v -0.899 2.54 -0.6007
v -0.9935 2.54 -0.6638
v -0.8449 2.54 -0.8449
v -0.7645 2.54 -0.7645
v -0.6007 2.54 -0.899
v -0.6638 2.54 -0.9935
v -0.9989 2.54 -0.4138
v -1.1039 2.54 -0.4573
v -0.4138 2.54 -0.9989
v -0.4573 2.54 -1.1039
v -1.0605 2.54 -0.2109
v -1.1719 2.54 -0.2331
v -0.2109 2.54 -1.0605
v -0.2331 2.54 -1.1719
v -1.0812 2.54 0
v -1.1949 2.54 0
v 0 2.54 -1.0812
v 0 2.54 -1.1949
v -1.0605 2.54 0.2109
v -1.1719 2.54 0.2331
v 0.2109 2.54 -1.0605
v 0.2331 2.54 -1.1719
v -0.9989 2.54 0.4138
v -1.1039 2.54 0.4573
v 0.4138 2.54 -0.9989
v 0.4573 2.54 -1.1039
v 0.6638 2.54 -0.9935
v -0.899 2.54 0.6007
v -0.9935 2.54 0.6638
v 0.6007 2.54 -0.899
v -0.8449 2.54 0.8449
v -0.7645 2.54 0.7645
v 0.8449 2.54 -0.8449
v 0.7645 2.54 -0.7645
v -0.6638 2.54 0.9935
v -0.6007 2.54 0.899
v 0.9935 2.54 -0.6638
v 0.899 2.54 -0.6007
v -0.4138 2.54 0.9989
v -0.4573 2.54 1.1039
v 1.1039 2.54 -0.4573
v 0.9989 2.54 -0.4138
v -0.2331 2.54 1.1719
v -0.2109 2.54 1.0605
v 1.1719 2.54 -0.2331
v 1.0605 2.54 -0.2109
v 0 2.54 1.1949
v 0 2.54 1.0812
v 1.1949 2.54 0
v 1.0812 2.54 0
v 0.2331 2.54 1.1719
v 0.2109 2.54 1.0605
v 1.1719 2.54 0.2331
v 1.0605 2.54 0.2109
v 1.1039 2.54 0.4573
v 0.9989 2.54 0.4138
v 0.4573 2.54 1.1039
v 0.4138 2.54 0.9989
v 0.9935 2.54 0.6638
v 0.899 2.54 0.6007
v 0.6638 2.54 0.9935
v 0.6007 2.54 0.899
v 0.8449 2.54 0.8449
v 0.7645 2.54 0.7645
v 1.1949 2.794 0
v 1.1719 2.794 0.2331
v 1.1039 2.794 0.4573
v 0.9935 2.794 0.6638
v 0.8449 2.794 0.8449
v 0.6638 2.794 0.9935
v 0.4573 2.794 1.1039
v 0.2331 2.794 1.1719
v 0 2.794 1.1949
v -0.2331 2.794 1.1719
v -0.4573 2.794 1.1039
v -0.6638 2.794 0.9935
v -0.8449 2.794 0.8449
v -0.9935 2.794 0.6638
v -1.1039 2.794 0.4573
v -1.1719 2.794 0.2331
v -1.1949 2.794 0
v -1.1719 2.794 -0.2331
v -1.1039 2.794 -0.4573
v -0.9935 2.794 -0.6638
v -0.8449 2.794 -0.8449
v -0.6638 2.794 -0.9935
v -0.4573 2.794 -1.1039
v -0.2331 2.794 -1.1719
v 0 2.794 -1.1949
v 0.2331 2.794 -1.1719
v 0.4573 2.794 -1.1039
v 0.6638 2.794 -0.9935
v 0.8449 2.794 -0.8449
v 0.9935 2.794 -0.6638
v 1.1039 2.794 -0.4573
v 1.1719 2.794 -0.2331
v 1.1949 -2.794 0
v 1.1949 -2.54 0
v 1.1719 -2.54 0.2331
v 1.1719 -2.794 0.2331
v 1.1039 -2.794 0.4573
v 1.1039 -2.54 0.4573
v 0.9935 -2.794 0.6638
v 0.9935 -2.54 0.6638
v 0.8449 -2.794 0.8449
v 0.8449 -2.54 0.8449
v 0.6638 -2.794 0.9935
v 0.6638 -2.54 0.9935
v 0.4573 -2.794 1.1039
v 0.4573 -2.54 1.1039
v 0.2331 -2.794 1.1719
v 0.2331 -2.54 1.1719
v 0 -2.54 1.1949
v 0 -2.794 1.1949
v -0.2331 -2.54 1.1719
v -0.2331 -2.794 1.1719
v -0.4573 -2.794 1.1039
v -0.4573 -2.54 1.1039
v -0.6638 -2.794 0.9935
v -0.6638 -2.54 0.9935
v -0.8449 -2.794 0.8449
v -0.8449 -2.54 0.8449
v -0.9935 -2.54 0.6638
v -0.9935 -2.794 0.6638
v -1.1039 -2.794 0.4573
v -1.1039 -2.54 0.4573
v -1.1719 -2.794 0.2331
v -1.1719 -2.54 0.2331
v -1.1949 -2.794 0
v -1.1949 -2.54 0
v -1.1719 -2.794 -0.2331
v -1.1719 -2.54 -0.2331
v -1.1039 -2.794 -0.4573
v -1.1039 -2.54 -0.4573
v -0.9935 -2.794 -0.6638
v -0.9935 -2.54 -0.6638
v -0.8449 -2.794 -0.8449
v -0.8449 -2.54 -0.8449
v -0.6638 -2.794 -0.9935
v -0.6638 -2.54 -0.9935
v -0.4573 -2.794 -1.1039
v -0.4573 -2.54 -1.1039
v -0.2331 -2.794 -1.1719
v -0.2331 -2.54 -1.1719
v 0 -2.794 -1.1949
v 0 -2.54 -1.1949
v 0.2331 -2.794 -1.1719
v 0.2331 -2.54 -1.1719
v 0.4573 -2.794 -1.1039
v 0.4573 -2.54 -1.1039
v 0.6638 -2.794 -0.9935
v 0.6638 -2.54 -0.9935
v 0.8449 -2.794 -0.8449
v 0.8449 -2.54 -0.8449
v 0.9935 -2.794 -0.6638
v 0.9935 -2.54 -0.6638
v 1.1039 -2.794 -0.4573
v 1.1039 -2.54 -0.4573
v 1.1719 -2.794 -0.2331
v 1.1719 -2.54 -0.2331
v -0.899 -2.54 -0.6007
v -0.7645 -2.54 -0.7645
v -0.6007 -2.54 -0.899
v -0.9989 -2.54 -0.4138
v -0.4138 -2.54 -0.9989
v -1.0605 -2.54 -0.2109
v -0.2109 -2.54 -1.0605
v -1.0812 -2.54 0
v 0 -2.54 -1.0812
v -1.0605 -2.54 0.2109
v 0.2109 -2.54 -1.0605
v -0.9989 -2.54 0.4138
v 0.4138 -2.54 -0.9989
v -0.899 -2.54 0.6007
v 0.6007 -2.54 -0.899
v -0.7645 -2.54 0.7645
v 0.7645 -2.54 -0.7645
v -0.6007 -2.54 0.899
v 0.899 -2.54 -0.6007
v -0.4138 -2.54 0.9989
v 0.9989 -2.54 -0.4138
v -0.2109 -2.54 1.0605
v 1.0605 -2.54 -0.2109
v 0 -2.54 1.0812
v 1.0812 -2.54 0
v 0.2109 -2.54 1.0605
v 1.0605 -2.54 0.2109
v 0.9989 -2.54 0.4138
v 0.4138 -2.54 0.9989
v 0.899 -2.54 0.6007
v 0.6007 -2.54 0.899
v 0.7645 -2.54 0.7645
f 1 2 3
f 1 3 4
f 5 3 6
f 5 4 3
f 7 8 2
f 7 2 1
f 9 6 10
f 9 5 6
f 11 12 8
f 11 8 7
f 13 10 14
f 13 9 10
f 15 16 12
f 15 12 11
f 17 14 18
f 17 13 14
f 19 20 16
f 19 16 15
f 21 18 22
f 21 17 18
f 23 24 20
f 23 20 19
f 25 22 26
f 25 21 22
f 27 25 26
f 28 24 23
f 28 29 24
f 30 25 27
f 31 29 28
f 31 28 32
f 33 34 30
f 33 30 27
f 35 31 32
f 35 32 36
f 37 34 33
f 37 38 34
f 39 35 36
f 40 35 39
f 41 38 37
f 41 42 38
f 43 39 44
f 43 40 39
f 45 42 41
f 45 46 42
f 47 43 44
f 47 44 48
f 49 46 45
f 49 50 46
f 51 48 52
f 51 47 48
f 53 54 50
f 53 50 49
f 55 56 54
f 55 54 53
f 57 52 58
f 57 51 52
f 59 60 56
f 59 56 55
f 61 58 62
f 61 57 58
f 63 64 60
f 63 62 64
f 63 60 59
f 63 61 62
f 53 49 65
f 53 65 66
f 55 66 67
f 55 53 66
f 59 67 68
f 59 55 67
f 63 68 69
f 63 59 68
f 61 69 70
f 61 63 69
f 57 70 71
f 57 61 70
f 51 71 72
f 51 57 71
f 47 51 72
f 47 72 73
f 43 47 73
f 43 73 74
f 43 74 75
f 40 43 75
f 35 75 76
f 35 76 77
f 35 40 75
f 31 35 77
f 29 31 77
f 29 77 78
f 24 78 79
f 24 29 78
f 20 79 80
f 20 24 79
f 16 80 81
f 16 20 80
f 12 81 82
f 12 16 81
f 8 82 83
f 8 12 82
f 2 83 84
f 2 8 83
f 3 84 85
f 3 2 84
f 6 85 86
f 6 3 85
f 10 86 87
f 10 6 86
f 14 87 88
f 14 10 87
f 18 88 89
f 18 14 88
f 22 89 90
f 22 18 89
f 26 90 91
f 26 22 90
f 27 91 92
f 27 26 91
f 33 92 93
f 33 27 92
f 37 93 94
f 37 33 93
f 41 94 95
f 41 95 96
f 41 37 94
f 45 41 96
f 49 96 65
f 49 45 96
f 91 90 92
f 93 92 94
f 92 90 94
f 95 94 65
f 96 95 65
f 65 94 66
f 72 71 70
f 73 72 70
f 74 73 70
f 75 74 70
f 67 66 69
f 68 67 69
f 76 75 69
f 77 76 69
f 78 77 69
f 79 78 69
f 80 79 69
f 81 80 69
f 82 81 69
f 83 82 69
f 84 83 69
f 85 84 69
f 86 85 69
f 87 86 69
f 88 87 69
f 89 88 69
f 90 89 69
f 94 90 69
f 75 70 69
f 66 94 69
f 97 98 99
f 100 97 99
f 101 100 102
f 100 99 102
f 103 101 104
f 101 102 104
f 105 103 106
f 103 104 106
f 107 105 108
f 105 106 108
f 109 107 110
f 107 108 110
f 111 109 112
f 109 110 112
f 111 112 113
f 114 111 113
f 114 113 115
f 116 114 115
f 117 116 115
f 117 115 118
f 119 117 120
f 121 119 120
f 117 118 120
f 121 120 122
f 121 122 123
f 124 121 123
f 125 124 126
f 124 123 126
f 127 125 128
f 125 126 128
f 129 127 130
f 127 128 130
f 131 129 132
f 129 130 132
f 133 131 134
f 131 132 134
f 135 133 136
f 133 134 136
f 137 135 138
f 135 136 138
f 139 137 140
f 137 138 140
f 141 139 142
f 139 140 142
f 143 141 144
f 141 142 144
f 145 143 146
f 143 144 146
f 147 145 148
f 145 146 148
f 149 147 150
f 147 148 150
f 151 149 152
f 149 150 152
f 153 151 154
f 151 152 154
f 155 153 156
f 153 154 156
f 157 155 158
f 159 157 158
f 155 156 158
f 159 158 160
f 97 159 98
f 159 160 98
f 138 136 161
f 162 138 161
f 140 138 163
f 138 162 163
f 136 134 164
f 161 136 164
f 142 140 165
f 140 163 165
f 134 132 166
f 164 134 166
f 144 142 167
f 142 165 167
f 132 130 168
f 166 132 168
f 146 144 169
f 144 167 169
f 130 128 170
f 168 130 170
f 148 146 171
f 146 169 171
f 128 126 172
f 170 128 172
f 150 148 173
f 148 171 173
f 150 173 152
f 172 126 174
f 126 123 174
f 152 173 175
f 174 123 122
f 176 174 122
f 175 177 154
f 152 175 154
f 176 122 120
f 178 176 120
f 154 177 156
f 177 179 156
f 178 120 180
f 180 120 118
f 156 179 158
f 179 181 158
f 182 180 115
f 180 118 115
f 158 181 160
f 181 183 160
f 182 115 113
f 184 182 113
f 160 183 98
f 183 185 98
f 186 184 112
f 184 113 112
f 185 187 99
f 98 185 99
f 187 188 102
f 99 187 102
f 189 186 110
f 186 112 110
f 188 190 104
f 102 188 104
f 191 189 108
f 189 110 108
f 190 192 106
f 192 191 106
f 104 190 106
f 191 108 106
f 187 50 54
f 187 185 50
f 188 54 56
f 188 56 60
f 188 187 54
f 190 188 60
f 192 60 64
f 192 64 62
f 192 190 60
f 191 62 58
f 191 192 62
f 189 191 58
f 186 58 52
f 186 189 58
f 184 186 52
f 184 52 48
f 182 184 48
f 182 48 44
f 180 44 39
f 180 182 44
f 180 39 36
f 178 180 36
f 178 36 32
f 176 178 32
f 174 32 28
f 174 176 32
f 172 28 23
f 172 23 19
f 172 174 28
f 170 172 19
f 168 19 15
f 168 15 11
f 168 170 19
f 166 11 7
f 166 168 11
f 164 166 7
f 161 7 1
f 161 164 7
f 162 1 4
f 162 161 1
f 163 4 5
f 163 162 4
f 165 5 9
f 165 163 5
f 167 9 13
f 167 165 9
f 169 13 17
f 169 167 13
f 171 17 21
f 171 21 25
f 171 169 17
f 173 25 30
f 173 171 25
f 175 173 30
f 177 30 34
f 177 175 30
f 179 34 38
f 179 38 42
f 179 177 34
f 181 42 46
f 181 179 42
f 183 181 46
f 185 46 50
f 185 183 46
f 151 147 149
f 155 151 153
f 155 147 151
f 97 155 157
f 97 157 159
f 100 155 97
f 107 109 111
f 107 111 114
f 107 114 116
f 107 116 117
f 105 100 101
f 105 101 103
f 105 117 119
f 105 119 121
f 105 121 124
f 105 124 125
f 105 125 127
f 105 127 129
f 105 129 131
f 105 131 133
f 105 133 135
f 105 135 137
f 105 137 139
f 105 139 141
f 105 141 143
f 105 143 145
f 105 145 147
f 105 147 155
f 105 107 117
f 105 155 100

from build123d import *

# Parameters (mm, degrees)
F0_R          = 1.0812294985
F1_DEPTH      = 2.54
F1_DEPTH_BACK = 2.54
F2_R          = 1.1948962621
F3_DEPTH      = 0.254


# Not quite as in the source:
# - a pattern or mirror of a feature is missing from the dataset's text; its kind, count and spacing are read off the source's solid


with BuildPart() as f1:
    # F0 (on Front) → F1 (new body, two sides)
    with BuildSketch(Plane.XZ) as f1_sk:
        Circle(F0_R)
    extrude(amount=F1_DEPTH)
    extrude(f1_sk.sketch, amount=-F1_DEPTH_BACK)

    # F2 (on face) → F3 (join)
    with BuildSketch(Plane.XZ.offset(2.54)):
        Circle(F2_R)
    f3 = extrude(amount=F3_DEPTH)

    # F3_copies: F3 across plane
    add(f3.mirror(Plane.ZX))


solid = f1.part
